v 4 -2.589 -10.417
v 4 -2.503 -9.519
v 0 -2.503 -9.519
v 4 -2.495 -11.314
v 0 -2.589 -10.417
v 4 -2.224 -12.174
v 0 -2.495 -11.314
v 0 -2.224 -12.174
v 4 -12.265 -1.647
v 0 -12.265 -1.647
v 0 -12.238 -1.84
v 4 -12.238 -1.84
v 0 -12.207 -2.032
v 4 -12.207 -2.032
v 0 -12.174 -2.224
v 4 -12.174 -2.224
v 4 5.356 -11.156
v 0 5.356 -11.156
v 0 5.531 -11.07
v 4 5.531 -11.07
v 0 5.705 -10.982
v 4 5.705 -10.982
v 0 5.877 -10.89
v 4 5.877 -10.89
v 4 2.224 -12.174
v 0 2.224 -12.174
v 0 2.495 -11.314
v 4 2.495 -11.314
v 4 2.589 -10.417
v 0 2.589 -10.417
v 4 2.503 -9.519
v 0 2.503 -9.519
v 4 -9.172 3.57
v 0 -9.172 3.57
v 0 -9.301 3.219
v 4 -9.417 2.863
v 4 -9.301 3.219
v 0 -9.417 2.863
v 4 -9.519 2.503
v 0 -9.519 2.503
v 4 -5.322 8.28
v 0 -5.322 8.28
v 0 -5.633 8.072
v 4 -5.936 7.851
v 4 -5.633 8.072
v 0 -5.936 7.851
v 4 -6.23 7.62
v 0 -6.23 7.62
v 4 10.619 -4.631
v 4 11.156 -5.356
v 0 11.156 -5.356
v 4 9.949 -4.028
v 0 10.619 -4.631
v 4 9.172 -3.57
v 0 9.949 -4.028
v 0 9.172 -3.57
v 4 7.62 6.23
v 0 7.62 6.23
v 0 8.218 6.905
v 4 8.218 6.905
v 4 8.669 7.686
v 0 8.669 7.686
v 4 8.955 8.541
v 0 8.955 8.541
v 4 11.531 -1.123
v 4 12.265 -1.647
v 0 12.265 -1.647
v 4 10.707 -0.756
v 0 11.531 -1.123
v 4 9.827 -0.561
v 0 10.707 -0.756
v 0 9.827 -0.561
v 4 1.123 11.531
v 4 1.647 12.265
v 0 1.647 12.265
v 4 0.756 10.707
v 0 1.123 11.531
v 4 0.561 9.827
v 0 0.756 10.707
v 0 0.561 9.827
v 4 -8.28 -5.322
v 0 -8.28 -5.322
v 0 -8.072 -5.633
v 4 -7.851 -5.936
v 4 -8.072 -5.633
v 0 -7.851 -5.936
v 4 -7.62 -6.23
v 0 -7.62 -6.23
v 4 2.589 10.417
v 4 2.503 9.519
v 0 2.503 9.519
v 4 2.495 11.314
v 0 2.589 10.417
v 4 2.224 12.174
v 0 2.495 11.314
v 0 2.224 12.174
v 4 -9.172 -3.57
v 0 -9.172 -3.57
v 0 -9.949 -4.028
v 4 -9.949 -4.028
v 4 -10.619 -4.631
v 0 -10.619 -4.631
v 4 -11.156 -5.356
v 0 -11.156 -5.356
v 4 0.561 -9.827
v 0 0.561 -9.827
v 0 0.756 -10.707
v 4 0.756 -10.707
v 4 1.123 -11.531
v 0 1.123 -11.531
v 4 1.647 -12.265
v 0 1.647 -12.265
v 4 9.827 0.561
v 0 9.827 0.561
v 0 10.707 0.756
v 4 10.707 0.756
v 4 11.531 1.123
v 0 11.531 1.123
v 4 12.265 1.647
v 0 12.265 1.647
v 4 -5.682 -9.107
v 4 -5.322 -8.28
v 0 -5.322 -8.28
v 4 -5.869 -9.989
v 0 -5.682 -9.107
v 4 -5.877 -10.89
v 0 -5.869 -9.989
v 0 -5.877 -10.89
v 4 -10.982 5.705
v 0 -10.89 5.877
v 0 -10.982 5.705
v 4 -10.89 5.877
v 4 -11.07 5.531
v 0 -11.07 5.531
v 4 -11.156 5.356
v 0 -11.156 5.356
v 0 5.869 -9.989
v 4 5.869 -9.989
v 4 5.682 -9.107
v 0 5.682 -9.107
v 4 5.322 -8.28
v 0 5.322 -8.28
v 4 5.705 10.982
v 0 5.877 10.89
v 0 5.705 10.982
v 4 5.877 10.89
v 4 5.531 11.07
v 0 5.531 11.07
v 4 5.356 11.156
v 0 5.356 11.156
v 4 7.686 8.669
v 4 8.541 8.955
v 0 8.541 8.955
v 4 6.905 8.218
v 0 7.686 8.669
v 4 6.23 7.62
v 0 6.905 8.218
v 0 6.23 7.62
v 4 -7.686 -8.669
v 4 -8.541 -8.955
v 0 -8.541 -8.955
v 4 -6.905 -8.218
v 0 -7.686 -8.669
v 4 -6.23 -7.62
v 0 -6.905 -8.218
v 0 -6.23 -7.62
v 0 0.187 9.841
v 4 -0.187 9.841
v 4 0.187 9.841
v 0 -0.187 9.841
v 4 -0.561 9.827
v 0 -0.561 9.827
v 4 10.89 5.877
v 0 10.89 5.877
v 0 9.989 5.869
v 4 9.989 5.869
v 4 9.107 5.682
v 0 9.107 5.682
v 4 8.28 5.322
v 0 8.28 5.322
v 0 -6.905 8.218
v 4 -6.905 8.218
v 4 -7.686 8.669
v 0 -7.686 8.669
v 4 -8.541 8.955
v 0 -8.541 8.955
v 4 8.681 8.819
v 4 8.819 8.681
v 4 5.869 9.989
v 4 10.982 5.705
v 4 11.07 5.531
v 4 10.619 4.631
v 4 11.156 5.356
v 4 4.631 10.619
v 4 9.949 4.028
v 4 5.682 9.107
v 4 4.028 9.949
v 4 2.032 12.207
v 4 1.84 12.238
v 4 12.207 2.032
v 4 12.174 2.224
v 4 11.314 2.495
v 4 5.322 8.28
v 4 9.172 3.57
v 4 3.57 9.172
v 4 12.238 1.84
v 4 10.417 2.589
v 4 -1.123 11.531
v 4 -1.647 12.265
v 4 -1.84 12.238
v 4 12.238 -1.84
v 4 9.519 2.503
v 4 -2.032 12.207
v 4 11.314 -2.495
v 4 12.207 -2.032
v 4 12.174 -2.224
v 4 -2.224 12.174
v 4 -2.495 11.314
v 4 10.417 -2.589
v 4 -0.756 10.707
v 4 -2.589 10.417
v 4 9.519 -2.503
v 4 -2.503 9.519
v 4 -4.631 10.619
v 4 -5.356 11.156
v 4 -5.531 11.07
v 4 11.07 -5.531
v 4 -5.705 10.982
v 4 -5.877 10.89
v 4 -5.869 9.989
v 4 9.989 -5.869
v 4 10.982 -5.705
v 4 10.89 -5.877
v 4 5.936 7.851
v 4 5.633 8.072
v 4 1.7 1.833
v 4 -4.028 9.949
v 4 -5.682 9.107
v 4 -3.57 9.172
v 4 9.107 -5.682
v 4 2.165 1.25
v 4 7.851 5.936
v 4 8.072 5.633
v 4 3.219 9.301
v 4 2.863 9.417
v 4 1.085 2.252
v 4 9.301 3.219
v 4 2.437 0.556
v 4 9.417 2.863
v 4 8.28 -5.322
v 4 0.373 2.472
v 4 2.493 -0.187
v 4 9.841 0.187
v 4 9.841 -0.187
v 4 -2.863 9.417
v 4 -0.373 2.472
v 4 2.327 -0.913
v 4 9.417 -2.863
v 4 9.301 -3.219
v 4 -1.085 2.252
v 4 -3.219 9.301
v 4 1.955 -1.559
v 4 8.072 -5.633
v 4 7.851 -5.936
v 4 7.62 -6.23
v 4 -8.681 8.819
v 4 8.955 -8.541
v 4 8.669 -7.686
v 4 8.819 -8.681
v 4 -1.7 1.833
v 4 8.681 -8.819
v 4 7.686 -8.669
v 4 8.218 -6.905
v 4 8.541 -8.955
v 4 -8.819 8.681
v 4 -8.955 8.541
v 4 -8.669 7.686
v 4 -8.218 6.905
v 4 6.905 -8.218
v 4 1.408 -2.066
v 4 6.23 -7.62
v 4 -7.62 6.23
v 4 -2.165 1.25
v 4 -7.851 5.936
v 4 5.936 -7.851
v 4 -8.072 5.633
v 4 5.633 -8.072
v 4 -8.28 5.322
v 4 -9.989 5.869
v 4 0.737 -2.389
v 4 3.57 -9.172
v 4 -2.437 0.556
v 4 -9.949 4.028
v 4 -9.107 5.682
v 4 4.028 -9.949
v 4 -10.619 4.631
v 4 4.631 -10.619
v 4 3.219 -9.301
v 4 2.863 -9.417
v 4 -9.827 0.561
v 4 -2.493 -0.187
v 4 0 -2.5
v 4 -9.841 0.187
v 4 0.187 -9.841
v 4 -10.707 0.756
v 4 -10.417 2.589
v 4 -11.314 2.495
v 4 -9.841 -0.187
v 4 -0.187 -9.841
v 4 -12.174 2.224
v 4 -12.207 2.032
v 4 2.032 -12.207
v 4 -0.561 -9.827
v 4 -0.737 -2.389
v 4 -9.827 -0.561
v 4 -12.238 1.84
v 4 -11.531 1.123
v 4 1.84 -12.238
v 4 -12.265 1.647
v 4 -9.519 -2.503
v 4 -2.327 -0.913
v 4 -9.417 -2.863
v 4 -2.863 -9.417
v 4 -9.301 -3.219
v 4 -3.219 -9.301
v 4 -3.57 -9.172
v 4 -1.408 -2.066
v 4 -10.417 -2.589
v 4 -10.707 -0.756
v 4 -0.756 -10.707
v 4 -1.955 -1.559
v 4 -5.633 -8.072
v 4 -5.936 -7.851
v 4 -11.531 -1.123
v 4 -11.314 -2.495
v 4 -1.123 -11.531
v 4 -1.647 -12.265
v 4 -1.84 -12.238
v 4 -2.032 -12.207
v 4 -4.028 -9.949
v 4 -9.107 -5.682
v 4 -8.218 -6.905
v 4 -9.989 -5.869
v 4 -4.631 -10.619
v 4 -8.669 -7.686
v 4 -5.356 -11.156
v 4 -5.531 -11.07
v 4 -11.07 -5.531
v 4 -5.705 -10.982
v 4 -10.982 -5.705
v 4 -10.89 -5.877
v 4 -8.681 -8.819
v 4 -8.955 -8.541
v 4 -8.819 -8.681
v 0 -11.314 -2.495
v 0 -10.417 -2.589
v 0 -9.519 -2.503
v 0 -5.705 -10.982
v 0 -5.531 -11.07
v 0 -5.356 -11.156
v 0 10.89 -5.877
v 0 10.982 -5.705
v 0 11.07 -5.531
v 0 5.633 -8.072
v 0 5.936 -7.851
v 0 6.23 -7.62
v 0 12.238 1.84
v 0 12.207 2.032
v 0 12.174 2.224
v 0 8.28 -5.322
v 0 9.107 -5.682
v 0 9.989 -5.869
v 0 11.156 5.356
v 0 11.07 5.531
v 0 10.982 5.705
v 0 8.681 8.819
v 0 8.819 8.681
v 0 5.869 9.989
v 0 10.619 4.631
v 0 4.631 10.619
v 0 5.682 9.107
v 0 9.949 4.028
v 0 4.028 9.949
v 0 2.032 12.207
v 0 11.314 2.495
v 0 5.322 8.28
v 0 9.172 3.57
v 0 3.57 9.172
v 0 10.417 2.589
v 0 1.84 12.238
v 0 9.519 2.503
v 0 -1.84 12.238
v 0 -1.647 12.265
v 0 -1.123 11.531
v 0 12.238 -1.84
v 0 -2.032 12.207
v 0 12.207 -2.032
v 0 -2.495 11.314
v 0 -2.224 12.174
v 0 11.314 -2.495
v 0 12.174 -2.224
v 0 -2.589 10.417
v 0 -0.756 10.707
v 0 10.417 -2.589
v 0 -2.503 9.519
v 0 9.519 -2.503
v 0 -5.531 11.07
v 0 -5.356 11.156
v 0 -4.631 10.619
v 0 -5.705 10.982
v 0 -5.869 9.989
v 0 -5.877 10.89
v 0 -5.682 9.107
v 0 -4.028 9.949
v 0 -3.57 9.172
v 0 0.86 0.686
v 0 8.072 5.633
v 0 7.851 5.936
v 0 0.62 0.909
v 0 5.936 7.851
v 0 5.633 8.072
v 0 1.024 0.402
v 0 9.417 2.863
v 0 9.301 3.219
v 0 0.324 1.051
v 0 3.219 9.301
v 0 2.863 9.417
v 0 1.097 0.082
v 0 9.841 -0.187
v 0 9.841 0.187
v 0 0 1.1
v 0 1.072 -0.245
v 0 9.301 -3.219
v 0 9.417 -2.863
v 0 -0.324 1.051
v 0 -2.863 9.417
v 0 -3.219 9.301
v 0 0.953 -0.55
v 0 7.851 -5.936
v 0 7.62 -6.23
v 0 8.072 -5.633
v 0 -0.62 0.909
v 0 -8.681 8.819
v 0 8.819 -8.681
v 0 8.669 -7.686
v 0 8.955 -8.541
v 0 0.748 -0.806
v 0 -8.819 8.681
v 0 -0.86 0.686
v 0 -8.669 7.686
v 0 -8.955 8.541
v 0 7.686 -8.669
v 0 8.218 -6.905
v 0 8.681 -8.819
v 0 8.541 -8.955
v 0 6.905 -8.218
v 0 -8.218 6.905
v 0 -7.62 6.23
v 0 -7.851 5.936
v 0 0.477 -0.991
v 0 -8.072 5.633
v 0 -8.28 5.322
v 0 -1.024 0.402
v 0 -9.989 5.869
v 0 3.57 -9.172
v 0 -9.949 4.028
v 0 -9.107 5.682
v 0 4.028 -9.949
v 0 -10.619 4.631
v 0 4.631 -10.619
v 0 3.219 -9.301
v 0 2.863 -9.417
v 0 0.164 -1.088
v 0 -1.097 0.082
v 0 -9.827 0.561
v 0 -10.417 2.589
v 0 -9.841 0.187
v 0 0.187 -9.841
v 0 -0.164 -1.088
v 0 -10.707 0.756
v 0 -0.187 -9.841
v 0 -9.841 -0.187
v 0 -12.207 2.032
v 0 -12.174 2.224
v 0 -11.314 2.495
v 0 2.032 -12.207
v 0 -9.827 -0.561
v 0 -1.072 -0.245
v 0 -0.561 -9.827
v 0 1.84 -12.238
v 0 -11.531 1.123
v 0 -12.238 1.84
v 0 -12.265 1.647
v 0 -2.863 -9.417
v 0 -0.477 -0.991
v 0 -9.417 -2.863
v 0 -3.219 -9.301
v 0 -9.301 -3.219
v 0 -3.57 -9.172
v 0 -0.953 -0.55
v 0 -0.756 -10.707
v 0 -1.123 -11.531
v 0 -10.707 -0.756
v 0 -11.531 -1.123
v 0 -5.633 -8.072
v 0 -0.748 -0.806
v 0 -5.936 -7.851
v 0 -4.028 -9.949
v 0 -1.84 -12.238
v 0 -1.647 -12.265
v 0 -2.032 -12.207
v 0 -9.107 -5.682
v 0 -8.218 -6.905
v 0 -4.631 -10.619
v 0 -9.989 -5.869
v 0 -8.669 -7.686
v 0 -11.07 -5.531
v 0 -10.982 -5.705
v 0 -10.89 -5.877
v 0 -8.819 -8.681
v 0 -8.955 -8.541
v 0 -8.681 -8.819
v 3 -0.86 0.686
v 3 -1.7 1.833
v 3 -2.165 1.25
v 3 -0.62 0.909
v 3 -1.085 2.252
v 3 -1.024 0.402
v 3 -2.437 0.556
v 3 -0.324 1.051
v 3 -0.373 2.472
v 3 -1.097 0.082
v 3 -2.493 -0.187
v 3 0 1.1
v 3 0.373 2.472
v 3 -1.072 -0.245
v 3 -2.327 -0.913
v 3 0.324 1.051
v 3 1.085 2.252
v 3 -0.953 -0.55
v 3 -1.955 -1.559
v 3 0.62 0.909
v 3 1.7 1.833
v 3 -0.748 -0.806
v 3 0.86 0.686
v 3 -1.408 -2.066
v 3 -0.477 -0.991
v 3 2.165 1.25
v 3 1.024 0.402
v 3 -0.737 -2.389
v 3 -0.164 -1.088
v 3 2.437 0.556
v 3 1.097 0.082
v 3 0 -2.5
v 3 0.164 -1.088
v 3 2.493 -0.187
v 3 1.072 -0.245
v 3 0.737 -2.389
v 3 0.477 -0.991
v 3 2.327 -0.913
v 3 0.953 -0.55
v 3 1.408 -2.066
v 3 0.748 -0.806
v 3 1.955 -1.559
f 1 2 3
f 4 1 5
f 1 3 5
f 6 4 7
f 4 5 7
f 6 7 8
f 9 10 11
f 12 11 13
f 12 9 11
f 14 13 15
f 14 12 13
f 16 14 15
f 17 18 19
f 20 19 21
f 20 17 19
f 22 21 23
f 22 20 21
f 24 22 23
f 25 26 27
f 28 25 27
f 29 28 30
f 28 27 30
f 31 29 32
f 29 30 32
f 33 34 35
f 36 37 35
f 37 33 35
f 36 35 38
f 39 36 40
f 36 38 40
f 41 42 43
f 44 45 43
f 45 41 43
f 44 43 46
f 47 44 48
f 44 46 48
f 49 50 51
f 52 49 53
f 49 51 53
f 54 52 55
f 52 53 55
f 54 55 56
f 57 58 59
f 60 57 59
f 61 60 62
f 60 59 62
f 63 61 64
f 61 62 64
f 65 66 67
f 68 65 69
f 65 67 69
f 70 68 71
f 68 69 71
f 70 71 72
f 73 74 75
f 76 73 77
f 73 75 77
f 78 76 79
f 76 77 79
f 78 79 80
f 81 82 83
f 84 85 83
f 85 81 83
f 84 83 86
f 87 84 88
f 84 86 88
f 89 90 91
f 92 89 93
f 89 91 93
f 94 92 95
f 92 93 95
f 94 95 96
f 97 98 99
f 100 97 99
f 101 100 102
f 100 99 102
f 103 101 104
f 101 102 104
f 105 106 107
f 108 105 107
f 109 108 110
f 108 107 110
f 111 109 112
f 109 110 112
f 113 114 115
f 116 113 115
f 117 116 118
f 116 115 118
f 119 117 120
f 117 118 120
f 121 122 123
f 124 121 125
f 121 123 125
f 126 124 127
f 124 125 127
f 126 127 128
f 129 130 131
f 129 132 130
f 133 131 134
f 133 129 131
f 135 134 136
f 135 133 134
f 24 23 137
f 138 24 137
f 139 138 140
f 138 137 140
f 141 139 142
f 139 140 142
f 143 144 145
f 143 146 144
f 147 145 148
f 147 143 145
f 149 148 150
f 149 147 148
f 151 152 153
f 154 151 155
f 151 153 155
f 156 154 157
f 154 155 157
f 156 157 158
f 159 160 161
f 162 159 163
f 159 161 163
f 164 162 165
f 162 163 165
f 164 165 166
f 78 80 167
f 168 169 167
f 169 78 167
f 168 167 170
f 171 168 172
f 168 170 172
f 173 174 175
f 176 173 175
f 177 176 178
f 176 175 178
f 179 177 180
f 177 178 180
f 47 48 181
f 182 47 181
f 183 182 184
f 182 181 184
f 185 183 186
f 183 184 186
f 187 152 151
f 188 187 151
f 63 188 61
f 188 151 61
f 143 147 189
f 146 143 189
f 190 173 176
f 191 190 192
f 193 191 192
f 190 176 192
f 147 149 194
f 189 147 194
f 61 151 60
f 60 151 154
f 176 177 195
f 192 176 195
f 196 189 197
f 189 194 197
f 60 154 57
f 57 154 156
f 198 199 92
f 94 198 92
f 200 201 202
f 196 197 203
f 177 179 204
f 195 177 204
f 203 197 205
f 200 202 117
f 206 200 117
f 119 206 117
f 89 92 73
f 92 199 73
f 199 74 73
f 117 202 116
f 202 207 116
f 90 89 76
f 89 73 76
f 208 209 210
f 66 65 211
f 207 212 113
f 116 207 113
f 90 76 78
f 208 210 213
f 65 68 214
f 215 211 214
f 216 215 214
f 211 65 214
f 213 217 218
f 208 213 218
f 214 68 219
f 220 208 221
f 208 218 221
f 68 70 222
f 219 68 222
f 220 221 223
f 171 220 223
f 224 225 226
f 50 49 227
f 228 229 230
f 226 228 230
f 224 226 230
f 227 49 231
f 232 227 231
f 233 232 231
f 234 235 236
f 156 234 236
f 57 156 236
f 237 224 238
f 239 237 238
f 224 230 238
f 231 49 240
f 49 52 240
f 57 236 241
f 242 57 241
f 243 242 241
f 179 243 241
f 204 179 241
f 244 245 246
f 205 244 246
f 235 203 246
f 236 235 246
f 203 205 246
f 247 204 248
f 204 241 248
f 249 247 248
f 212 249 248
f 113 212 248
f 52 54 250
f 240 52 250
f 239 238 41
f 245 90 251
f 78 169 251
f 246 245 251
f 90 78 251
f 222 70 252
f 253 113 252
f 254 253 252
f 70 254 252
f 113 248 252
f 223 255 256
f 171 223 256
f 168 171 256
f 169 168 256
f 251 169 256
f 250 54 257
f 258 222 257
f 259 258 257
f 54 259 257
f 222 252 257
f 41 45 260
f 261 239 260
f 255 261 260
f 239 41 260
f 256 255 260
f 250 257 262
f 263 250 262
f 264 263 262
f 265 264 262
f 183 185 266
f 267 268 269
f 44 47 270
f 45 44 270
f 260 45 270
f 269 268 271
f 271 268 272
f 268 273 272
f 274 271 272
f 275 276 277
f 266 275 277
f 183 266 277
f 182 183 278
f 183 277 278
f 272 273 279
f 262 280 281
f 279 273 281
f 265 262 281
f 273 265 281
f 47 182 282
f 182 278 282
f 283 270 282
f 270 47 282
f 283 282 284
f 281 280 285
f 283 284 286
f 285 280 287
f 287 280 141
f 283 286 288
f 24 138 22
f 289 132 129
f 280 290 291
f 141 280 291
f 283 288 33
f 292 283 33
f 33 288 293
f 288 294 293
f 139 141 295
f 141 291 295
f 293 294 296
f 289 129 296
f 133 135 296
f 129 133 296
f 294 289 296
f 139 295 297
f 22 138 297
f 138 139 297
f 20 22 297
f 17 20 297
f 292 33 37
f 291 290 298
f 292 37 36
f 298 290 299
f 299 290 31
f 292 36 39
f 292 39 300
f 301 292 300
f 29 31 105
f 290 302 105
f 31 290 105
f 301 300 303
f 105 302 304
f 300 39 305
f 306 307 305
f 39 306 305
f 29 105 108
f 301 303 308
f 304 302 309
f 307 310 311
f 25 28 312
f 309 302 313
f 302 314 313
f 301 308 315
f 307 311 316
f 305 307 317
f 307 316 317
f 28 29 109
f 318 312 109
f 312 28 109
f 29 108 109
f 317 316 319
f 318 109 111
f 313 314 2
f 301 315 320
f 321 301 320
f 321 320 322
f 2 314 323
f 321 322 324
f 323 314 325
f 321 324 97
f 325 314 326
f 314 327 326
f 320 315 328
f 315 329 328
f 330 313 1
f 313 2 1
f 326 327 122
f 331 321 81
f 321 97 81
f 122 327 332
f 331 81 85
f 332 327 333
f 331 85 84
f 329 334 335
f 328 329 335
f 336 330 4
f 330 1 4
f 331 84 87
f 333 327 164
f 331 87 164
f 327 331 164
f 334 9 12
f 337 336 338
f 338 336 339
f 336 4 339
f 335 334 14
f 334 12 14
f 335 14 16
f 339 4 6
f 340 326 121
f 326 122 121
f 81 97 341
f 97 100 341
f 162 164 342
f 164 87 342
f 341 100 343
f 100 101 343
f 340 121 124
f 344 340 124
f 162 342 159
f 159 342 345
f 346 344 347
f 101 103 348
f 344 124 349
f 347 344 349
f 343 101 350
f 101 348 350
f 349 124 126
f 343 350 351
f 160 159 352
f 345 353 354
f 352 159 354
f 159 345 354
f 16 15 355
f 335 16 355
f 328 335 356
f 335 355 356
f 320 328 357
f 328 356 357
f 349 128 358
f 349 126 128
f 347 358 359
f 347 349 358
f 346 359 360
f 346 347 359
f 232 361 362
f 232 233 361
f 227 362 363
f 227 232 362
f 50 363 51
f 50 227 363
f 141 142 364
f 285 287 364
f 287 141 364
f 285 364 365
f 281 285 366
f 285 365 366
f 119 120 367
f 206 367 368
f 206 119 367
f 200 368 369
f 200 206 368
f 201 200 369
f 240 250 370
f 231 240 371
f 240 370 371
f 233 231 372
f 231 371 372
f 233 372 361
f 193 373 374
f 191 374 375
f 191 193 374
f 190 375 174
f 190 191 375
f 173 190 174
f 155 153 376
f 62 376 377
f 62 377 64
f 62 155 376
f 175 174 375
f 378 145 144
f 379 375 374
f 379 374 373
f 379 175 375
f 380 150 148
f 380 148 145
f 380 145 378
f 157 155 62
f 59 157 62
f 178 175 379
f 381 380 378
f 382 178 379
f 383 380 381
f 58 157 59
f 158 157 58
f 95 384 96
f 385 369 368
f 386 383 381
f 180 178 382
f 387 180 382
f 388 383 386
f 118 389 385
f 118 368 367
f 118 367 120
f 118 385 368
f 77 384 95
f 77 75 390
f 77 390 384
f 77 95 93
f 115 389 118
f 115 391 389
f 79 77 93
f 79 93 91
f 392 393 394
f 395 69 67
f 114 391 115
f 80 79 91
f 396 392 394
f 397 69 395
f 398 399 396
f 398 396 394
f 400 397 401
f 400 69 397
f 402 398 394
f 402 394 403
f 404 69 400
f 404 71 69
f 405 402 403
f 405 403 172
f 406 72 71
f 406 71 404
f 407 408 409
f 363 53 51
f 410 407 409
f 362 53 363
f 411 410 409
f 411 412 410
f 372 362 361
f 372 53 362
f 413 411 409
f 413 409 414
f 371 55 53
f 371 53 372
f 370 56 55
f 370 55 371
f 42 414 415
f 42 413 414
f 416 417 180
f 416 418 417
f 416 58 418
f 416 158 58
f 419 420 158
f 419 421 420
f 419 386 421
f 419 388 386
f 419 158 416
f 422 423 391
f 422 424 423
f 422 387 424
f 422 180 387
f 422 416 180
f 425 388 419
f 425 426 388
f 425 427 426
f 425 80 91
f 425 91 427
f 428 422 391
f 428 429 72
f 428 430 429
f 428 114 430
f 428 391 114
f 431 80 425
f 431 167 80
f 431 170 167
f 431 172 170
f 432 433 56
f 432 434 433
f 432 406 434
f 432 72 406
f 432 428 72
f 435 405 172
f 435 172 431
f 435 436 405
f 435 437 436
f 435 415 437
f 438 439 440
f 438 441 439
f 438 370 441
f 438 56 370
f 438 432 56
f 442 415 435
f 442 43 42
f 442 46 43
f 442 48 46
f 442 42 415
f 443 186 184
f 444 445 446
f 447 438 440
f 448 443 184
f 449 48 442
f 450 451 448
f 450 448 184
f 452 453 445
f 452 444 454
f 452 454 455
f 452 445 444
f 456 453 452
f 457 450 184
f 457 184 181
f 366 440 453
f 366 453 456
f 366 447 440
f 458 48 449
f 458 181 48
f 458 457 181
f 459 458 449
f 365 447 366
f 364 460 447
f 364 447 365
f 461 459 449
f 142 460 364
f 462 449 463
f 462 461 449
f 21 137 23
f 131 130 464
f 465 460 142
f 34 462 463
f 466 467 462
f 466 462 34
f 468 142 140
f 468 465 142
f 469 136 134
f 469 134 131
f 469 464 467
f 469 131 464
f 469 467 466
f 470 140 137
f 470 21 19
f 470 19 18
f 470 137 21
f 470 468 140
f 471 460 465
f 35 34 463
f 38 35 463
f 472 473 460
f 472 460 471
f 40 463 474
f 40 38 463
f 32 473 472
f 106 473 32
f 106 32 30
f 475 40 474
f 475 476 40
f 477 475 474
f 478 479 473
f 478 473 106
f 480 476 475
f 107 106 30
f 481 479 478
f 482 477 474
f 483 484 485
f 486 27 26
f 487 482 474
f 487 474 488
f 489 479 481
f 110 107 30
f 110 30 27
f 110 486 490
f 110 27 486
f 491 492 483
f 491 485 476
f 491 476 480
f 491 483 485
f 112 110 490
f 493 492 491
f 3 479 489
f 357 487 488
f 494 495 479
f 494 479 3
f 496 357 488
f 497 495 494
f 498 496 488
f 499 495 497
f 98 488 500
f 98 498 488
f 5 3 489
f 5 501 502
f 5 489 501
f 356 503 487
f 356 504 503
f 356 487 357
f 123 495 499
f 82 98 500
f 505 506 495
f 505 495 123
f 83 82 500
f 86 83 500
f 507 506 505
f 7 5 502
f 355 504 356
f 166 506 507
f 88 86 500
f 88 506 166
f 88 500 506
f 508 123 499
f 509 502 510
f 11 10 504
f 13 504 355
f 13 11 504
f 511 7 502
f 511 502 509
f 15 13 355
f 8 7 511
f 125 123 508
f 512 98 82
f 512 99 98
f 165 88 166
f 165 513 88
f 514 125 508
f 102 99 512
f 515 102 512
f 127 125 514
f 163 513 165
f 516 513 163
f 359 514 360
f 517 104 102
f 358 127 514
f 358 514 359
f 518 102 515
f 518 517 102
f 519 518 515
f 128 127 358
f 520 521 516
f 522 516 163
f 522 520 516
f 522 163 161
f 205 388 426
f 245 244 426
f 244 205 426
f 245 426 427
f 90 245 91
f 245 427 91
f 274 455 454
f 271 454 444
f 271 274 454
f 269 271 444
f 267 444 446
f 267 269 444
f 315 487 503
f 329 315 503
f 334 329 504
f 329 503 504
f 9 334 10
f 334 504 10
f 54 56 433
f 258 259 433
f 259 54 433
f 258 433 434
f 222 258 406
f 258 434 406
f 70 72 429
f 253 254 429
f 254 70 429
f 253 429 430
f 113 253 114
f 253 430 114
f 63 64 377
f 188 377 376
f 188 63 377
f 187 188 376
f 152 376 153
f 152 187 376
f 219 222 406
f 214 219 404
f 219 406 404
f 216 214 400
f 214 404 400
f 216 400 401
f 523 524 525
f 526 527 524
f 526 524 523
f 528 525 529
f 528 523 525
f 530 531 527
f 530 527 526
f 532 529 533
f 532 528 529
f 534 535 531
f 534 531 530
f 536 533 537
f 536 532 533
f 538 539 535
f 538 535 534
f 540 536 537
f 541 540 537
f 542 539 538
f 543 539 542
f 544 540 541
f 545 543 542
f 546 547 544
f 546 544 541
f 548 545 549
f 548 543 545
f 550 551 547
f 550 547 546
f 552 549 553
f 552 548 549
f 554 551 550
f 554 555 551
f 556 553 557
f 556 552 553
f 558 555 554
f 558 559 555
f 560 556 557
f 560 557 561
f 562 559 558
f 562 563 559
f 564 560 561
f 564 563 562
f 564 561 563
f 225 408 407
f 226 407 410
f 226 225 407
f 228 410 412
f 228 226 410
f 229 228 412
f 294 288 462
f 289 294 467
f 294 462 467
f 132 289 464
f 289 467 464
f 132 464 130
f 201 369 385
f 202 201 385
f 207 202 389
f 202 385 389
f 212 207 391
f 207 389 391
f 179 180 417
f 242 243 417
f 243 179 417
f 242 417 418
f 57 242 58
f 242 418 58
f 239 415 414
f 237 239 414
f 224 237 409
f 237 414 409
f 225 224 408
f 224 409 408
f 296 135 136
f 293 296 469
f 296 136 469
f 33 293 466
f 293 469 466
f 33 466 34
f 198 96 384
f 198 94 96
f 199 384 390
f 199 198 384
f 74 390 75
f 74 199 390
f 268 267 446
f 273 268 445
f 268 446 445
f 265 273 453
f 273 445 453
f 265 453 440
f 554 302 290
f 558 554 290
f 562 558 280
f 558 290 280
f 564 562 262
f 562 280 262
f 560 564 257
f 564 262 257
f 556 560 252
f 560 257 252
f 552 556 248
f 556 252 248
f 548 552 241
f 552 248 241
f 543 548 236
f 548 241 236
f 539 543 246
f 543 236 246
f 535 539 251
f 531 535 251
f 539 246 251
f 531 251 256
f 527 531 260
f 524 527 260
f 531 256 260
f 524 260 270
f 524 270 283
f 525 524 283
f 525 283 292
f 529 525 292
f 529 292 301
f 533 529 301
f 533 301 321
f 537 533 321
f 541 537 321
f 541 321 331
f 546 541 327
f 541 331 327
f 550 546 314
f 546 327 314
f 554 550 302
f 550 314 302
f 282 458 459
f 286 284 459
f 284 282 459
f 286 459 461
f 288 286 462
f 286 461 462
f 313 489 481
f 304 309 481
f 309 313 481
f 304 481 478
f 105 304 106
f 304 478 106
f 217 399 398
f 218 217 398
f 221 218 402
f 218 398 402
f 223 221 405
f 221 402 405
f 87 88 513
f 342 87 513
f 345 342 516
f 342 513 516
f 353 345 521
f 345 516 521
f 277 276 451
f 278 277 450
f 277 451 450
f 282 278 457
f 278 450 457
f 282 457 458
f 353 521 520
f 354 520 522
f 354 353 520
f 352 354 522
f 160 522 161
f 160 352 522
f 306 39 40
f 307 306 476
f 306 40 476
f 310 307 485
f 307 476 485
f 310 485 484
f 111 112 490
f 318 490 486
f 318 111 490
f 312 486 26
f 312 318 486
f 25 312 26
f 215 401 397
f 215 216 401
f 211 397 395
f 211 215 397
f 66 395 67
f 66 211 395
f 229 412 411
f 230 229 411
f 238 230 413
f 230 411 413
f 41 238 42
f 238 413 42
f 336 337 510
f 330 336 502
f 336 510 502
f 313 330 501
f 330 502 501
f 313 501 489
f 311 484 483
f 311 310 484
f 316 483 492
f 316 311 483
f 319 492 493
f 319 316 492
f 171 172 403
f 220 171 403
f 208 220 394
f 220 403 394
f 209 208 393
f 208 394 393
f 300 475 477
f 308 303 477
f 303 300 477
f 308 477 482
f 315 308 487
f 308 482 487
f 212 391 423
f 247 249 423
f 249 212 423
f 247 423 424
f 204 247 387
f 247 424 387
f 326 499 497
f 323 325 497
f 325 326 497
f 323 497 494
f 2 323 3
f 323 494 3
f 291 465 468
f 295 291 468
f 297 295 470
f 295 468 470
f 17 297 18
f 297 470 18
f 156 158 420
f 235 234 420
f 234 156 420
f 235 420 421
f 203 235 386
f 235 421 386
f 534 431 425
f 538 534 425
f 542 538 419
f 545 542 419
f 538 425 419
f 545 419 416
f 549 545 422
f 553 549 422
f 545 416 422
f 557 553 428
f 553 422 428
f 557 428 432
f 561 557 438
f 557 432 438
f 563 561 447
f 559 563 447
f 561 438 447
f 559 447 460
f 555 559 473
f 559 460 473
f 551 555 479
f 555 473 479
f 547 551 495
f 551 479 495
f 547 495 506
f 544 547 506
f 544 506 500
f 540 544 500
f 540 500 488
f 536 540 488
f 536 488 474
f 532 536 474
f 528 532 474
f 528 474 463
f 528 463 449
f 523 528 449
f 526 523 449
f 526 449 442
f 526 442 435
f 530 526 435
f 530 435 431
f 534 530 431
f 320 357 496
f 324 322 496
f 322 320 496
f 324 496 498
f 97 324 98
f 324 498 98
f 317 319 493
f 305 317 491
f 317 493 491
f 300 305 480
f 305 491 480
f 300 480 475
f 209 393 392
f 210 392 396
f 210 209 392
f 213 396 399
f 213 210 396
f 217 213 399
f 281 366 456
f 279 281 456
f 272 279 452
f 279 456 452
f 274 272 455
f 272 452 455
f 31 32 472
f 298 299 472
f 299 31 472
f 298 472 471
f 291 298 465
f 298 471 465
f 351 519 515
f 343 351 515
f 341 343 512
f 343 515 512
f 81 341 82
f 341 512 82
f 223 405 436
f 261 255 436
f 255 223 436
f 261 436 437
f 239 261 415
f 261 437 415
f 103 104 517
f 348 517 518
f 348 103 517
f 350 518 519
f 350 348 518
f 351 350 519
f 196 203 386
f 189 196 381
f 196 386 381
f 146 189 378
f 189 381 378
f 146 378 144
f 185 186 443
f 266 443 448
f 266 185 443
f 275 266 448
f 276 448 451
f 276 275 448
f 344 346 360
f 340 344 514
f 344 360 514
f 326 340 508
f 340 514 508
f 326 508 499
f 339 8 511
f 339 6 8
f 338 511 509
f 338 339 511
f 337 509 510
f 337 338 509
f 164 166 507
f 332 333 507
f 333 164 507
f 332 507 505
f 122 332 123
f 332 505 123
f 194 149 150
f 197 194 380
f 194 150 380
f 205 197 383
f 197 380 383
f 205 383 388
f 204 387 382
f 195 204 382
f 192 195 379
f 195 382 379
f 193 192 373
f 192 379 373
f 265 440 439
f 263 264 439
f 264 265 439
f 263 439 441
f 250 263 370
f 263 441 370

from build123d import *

# Parameters (mm, degrees)
BASPROSKE_W          = 4
BASPROSKE_H          = 12.375
TOOTHCUT_DEPTH       = 18.952193459
TEETHCUTS_COUNT      = 20
M2_CLEARANCE_HOLE1_D = 2.2
SKETCH3_R            = 2.5
CUT_EXTRUDE1_DEPTH   = 1


with BuildPart() as part:
    # BasProSke → Base-Revolve (revolve)
    with BuildSketch(Plane(origin=(0, 0, 0), x_dir=(1, 0, 0), z_dir=(0, 1, 0)), mode=Mode.PRIVATE) as base_revolve_sk:
        with Locations((2, 6.1875)):
            Rectangle(BASPROSKE_W, BASPROSKE_H)
    revolve(base_revolve_sk.sketch.rotate(Axis((-10, 0, 0), (1, 0, 0)), 180), axis=Axis((-10, 0, 0), (1, 0, 0)))

    # TooCutSke → ToothCut (cut, through all)
    with BuildSketch(Plane(origin=(0, 0, 0), x_dir=(0, 0, -1), z_dir=(1, 0, 0))):
        with BuildLine():
            ThreePointArc((0.561279811, 9.826733564), (0, 9.84275), (-0.561279811, 9.826733564))
            ThreePointArc((-0.561279811, 9.826733564), (-0.925277854, 11.14210546), (-1.666860651, 12.287859689))
            ThreePointArc((-1.666860651, 12.287859689), (0, 12.4004), (1.666860651, 12.287859689))
            ThreePointArc((1.666860651, 12.287859689), (0.925277854, 11.14210546), (0.561279811, 9.826733564))
        make_face()
    toothcut = extrude(amount=TOOTHCUT_DEPTH, mode=Mode.SUBTRACT)

    # TeethCuts: ToothCut ×20 about axis
    teethcuts_axis = Axis((0, 0, 0), (1, 0, 0))
    for i in range(1, TEETHCUTS_COUNT):
        add(toothcut.rotate(teethcuts_axis, i * 360 / TEETHCUTS_COUNT), mode=Mode.SUBTRACT)

    # M2 Clearance Hole1 (through all)
    with Locations(Plane(origin=(4, 0, 0), x_dir=(0, 0, -1), z_dir=(1, 0, 0))):
        with Locations((0, 0)):
            Hole(M2_CLEARANCE_HOLE1_D / 2)

    # Sketch3 → Cut-Extrude1 (cut)
    with BuildSketch(Plane(origin=(4, 0, 0), x_dir=(0, 0, -1), z_dir=(1, 0, 0))):
        Circle(SKETCH3_R)
    extrude(amount=-CUT_EXTRUDE1_DEPTH, mode=Mode.SUBTRACT)


solid = part.part
